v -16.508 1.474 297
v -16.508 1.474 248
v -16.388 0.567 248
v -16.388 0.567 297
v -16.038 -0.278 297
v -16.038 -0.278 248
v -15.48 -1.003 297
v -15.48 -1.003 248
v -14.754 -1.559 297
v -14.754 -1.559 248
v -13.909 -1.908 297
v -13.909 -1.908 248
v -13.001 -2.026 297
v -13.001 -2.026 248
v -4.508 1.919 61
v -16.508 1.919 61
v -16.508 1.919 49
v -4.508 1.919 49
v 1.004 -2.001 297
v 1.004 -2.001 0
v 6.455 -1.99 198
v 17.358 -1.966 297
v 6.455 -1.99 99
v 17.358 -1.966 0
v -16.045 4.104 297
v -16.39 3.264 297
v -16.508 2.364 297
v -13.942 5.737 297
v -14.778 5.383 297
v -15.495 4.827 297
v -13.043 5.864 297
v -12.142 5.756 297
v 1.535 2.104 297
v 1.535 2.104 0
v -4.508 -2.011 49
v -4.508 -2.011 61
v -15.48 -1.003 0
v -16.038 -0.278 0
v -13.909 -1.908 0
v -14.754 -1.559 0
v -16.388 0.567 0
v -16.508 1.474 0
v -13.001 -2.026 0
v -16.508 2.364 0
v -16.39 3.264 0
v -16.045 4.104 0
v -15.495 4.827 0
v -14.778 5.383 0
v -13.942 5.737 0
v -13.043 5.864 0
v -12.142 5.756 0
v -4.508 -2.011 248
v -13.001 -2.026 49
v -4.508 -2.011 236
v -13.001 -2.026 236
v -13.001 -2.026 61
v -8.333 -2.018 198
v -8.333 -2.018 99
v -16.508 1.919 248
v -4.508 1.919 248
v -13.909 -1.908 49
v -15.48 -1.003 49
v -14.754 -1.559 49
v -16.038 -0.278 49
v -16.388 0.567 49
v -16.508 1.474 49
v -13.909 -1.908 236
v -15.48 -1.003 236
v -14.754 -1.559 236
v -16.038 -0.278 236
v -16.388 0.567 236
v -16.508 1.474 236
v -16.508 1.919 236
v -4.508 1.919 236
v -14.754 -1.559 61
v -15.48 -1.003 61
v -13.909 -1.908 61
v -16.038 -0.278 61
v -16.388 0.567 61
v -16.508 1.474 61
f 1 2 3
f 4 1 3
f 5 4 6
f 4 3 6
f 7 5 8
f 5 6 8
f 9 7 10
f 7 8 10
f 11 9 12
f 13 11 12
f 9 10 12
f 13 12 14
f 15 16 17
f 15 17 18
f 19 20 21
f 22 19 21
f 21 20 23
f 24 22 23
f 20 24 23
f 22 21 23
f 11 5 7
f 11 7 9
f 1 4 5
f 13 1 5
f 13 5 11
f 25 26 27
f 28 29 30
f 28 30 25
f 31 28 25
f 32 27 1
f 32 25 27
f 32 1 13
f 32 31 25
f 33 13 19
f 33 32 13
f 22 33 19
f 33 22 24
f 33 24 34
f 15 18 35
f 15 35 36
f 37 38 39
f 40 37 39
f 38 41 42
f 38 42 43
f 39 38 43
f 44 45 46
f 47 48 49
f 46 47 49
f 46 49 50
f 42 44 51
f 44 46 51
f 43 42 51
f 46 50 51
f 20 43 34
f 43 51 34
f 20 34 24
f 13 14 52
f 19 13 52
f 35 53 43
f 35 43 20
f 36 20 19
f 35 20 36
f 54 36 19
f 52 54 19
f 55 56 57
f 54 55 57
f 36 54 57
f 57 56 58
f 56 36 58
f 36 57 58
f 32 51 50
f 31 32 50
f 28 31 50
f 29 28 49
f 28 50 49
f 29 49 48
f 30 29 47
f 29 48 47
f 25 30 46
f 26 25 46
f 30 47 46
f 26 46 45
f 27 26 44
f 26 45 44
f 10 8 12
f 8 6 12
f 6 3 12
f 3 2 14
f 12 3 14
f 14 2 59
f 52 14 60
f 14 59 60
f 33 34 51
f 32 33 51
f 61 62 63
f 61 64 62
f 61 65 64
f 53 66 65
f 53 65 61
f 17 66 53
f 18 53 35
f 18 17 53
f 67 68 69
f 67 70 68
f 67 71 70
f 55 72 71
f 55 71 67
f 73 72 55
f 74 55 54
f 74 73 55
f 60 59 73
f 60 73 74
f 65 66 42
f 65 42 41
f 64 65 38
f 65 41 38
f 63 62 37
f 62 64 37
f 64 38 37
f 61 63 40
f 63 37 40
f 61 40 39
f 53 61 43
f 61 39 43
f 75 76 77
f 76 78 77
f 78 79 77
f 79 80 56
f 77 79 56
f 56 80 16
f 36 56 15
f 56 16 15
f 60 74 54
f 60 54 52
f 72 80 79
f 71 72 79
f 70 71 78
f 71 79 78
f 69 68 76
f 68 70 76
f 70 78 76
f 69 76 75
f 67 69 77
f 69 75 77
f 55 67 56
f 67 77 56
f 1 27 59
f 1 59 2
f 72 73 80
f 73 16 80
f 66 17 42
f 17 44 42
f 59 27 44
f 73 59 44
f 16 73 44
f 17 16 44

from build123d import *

# Parameters (mm, degrees)
BOSS_EXTRUDE1_DEPTH = 297
SKETCH2_W           = 12
SKETCH2_H           = 12
CUT_EXTRUDE1_DEPTH  = 4.945151286


with BuildPart() as part:
    # Sketch1 → Boss-Extrude1 (new body)
    with BuildSketch(Plane.XY):
        with BuildLine():
            Line((-16.507687929, 2.364265208), (-16.507687929, 1.473962835))
            ThreePointArc((-16.507687929, 1.473962835), (-15.480371114, -1.003099511), (-13.001494862, -2.026031686))
            add(Edge.make_bspline(
                [(-13.001494862, -2.026031686), (-8.333069772, -2.017771139), (-3.664620889, -2.009483171), (1.003807611, -2.000595376)],
                knots=[0.953389627, 0.953389627, 0.953389627, 0.953389627, 1, 1, 1, 1], degree=3))
            add(Edge.make_bspline(
                [(1.003807611, -2.000595376), (6.455319533, -1.990216739), (11.906803659, -1.979020166), (17.35818964, -1.966094188)],
                knots=[1, 1, 1, 1, 1.054428809, 1.054428809, 1.054428809, 1.054428809], degree=3))
            Line((17.35818964, -1.966094188), (1.535215778, 2.104151955))
            add(Edge.make_bspline(
                [(1.535215778, 2.104151955), (-1.489505662, 2.933853479), (-6.037640577, 4.177264079), (-10.60829151, 5.363992379), (-12.14197353, 5.755509607)],
                knots=[0, 0, 0, 0, 0.03125, 0.04700086, 0.04700086, 0.04700086, 0.04700086], degree=3))
            ThreePointArc((-12.14197353, 5.755509607), (-15.154778938, 5.128320236), (-16.507687929, 2.364265208))
        make_face()
    extrude(amount=BOSS_EXTRUDE1_DEPTH)

    # Sketch2 → Cut-Extrude1 (cut, through all)
    with BuildSketch(Plane.XZ.offset(-1.919114021)):
        with Locations((-10.507687929, 242)):
            Rectangle(SKETCH2_W, SKETCH2_H)
        with Locations((-10.507687929, 55)):
            Rectangle(SKETCH2_W, SKETCH2_H)
    extrude(amount=CUT_EXTRUDE1_DEPTH, mode=Mode.SUBTRACT)


solid = part.part
